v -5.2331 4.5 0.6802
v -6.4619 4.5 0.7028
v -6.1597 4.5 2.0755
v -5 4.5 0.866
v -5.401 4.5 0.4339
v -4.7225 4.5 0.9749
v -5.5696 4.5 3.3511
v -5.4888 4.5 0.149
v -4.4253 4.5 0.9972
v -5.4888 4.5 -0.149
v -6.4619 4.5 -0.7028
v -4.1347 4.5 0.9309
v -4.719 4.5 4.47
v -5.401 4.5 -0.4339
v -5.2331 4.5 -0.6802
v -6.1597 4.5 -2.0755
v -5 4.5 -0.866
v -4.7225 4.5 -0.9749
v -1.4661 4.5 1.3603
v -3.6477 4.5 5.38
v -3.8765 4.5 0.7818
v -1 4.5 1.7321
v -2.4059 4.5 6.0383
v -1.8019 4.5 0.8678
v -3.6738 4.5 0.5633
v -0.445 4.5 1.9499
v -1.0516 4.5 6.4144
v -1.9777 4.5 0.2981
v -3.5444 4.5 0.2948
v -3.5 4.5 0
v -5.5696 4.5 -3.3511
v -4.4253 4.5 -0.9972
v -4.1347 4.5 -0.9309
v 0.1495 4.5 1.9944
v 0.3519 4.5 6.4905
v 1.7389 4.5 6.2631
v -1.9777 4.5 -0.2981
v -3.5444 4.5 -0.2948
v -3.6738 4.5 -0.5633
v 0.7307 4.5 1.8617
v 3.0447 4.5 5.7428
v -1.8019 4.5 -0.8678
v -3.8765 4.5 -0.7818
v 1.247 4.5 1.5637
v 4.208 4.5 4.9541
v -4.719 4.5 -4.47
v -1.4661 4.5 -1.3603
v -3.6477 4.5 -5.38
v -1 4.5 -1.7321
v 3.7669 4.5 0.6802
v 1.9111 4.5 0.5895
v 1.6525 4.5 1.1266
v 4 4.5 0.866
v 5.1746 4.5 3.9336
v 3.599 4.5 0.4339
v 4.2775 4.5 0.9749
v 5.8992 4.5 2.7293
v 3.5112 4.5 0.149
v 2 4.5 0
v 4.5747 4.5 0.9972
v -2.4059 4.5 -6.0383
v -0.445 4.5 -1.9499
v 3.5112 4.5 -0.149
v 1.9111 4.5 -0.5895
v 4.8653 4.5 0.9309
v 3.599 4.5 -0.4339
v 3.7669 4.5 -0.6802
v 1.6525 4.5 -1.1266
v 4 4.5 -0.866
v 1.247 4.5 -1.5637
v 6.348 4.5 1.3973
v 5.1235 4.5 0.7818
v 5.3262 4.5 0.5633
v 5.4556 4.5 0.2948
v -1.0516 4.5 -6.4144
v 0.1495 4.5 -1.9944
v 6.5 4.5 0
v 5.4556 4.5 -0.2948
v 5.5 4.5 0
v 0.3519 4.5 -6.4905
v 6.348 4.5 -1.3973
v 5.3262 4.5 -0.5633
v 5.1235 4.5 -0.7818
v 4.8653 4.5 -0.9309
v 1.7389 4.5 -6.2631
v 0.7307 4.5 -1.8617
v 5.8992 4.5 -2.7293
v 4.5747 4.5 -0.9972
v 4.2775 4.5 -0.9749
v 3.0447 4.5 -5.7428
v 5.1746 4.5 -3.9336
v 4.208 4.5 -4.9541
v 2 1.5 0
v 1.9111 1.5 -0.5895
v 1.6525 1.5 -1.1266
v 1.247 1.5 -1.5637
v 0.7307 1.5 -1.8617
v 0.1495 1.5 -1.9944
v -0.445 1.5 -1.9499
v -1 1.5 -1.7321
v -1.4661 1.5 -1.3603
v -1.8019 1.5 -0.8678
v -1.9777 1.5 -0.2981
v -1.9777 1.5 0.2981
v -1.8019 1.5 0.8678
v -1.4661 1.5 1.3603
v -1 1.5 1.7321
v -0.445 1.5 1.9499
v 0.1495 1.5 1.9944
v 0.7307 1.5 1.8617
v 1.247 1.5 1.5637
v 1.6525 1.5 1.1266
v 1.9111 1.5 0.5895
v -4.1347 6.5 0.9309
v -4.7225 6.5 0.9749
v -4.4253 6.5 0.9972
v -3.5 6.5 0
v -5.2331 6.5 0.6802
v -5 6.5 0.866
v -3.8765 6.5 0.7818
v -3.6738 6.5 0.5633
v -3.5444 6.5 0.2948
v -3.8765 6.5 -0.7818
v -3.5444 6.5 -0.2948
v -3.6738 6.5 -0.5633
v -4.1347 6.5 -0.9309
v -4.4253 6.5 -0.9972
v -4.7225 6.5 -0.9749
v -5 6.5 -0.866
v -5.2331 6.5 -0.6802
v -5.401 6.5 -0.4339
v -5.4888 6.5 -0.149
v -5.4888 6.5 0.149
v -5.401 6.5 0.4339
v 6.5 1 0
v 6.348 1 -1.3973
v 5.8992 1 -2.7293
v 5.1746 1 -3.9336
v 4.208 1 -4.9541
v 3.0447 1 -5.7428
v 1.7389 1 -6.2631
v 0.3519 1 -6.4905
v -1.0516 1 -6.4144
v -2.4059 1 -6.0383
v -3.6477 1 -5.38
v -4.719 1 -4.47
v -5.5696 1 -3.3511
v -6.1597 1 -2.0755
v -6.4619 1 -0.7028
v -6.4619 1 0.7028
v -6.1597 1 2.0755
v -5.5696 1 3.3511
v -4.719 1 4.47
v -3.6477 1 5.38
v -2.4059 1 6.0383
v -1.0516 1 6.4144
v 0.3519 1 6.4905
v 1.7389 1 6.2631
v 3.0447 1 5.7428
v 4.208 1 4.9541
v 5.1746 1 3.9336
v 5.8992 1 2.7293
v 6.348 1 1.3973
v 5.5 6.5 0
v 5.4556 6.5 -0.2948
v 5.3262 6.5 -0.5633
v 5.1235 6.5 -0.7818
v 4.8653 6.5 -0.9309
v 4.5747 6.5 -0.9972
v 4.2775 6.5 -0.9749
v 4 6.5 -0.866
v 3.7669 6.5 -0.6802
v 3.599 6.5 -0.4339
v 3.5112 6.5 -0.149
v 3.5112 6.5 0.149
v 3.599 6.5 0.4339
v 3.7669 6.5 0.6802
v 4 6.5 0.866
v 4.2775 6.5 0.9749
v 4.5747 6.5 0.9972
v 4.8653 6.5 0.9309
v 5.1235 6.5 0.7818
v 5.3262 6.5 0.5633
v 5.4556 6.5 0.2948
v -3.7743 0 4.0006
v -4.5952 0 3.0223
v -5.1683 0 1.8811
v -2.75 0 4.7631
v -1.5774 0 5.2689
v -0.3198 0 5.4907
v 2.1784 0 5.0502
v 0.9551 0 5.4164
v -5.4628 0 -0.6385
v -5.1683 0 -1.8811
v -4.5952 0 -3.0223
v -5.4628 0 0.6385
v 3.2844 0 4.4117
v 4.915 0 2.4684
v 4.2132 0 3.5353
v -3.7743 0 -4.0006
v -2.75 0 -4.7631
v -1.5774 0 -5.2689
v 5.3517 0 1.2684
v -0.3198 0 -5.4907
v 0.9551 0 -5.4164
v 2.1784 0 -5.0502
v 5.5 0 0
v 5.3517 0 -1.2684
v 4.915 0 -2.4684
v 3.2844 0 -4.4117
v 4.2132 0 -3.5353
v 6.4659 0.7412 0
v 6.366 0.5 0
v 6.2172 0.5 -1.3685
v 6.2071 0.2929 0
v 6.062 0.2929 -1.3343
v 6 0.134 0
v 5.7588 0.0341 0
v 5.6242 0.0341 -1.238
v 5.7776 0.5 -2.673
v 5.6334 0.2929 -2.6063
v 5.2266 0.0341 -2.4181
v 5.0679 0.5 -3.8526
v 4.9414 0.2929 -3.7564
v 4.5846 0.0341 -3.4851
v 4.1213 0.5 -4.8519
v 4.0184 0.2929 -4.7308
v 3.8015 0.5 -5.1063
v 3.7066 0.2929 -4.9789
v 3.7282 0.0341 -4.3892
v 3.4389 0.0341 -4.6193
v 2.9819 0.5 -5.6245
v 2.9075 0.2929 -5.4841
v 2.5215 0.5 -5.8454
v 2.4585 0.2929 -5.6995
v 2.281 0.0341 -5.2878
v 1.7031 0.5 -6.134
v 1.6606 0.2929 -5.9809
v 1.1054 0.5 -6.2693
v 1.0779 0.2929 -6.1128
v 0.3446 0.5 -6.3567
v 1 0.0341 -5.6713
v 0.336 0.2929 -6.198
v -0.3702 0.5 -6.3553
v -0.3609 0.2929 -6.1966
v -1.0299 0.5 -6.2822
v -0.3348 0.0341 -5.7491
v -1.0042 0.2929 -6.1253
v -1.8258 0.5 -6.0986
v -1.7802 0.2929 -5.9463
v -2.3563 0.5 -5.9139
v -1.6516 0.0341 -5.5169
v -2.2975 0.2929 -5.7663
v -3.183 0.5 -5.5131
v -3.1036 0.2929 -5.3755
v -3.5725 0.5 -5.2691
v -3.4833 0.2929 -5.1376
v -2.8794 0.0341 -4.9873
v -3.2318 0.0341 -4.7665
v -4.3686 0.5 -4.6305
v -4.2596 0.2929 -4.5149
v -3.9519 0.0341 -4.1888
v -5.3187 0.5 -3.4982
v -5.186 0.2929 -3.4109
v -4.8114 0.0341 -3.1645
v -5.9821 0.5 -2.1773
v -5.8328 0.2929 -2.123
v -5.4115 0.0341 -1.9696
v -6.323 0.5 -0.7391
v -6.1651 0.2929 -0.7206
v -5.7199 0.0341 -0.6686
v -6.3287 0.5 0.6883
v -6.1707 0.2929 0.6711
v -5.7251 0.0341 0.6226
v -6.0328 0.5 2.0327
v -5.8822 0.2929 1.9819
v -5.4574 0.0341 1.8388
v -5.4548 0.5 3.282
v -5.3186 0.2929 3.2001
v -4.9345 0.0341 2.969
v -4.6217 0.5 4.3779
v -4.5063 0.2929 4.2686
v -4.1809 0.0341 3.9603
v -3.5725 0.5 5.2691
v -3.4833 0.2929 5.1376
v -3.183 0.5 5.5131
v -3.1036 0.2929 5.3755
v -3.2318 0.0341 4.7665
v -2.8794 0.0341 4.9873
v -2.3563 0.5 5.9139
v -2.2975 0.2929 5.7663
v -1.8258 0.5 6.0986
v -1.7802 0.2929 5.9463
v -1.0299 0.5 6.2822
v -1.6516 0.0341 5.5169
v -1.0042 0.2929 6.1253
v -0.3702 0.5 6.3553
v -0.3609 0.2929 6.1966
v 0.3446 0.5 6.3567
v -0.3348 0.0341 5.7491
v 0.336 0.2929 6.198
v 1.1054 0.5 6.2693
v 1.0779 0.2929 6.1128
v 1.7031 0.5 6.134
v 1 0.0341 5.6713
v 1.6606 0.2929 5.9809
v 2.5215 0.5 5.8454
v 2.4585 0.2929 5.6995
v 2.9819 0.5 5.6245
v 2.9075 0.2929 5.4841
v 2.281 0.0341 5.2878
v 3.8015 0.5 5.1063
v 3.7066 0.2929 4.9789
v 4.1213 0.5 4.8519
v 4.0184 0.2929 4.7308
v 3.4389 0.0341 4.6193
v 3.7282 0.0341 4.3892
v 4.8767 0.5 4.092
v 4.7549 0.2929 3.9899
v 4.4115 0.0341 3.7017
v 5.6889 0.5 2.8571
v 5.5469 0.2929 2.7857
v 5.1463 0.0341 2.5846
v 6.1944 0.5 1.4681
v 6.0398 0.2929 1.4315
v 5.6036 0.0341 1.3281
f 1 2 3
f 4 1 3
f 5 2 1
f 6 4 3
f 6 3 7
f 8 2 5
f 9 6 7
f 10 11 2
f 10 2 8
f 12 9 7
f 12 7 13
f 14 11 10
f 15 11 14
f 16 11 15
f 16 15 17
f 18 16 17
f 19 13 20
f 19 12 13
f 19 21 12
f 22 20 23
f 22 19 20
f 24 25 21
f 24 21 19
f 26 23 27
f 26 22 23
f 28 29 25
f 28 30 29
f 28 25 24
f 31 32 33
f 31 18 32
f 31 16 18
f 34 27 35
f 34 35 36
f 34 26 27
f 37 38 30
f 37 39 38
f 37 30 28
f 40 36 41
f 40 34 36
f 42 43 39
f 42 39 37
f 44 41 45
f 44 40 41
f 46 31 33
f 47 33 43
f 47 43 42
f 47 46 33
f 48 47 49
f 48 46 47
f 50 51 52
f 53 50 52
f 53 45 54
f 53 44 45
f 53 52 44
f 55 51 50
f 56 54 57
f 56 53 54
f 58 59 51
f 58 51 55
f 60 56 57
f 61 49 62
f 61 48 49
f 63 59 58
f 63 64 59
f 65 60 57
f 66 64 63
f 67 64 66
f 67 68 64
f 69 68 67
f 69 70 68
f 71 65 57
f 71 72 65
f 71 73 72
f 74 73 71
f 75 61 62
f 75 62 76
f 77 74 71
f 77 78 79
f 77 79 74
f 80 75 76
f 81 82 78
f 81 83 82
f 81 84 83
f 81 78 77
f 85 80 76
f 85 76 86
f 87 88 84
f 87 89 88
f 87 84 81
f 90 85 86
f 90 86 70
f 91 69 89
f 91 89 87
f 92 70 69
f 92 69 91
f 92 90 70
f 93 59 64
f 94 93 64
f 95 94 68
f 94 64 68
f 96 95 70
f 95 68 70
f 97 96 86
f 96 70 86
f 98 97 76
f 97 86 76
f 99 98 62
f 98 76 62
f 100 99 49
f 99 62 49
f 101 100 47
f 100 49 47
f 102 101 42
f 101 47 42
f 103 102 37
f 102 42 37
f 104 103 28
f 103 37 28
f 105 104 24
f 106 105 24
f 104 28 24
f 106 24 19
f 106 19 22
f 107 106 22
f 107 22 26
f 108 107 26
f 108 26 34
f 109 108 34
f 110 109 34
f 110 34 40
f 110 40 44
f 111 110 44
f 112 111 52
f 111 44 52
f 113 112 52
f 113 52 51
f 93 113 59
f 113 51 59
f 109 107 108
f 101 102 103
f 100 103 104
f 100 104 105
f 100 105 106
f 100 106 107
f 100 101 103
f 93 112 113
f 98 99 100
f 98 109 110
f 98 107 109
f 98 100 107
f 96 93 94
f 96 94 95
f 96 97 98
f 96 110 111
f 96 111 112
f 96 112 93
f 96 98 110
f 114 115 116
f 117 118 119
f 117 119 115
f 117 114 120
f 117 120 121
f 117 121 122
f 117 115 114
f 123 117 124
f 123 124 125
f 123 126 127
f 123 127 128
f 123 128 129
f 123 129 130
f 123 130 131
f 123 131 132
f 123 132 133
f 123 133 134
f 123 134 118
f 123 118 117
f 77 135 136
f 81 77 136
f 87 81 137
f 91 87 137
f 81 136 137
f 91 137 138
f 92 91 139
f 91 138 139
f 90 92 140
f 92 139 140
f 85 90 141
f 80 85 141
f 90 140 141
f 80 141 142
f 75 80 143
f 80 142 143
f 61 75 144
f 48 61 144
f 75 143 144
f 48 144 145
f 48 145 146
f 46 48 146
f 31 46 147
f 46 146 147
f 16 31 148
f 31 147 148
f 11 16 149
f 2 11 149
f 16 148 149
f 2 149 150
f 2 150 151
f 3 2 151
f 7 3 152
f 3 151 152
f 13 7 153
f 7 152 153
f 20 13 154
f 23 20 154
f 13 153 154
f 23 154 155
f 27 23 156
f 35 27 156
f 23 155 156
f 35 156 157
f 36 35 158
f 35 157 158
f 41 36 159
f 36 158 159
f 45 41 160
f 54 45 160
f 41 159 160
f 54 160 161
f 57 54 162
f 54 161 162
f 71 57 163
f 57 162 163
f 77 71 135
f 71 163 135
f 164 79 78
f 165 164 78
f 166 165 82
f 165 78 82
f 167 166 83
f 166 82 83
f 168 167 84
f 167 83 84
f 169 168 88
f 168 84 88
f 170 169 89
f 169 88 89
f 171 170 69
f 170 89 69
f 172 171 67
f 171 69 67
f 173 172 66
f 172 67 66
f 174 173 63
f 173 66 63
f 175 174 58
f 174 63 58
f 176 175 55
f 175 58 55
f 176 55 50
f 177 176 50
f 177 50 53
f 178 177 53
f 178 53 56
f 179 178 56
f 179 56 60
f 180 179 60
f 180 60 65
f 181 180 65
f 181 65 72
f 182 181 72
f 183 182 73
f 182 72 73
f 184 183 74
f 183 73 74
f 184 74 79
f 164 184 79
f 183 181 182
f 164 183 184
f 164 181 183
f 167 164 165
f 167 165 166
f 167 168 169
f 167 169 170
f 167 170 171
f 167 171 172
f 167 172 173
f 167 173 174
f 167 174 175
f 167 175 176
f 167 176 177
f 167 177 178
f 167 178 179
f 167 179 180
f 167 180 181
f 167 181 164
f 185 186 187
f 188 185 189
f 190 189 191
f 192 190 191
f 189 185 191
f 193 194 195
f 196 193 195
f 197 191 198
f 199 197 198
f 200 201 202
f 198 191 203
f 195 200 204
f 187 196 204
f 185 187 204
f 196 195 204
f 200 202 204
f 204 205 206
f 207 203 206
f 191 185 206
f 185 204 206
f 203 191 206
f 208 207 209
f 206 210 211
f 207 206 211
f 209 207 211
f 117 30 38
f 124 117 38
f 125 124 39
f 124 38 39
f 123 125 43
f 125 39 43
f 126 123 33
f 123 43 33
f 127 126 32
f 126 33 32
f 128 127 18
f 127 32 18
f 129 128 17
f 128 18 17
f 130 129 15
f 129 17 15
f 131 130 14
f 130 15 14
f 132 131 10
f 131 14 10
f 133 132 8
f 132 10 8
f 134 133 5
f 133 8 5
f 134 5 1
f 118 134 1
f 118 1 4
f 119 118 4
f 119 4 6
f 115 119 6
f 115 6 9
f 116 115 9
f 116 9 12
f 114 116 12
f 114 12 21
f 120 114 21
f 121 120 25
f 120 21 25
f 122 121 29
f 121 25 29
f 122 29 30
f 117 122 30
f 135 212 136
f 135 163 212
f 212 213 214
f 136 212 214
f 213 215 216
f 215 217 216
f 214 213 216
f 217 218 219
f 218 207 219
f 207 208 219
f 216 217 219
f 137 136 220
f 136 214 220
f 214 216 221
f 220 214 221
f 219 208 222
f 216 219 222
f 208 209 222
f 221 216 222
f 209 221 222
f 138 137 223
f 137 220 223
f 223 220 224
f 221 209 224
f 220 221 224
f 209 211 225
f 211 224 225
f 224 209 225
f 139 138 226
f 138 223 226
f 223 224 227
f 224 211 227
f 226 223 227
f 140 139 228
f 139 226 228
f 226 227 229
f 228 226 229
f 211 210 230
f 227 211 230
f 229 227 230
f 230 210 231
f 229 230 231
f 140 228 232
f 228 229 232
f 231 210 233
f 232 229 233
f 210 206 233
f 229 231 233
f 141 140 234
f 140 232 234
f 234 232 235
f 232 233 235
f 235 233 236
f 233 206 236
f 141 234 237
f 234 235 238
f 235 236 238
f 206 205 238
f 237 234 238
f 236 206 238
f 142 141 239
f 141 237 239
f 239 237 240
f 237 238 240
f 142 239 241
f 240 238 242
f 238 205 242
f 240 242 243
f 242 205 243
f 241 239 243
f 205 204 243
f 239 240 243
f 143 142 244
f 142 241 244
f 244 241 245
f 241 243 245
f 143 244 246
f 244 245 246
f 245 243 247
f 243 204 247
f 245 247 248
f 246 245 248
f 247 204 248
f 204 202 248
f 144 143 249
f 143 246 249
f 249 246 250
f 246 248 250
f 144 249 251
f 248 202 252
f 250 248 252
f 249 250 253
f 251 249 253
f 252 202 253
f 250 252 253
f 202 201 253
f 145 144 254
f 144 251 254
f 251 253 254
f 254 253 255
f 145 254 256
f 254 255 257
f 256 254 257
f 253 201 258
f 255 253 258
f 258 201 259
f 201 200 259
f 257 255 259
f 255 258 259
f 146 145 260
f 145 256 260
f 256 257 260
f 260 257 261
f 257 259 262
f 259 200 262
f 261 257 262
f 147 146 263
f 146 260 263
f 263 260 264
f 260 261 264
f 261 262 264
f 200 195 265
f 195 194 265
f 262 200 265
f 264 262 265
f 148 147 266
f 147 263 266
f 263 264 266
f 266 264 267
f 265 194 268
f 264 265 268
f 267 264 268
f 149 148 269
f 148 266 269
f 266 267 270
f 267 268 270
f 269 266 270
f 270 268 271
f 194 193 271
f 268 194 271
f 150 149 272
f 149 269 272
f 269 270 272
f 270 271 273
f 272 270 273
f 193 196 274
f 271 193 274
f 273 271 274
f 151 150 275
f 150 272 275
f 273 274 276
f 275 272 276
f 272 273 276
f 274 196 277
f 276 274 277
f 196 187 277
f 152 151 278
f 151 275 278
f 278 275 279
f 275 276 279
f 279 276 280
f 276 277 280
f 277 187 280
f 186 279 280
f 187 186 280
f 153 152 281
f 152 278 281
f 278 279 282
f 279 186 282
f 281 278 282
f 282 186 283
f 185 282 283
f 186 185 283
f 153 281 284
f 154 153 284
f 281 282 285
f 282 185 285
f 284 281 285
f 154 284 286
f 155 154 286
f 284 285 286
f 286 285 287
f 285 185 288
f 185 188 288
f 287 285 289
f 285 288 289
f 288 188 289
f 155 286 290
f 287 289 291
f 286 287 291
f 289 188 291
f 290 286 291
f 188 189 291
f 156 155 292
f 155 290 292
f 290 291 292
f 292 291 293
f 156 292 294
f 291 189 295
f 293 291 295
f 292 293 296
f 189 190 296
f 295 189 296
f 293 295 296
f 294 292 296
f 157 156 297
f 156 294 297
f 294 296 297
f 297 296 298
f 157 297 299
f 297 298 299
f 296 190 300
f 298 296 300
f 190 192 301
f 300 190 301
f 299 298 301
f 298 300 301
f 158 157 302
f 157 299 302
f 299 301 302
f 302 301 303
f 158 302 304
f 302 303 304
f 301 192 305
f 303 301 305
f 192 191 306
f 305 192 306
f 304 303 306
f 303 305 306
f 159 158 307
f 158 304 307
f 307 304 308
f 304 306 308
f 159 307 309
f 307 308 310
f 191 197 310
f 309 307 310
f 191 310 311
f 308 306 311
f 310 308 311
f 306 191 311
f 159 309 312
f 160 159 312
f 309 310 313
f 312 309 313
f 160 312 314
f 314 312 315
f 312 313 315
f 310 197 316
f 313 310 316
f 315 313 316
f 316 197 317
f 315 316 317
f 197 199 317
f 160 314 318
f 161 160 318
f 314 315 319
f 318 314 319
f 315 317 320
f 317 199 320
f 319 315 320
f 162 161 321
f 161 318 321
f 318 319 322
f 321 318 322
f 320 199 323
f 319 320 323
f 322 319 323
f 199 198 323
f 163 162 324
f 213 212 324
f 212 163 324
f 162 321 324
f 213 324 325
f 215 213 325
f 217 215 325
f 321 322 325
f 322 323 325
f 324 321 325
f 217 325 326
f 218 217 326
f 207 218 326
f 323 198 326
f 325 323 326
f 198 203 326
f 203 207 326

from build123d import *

# Parameters (mm, degrees)
F0_R     = 6.5
F1_DEPTH = 4.5
F2_R     = 2
F3_DEPTH = 3
F4_R     = 1
F5_DEPTH = 2
F6_R     = 1
F8_ANGLE = -90


with BuildPart() as f1:
    # F0 (on Top) → F1 (new body)
    with BuildSketch(Plane.XY):
        Circle(F0_R)
    extrude(amount=F1_DEPTH)

    # F2 (on face) → F3 (cut)
    with BuildSketch(Plane.XY.offset(4.5)):
        Circle(F2_R)
    extrude(amount=-F3_DEPTH, mode=Mode.SUBTRACT)

    # F4 (on face) → F5 (join)
    with BuildSketch(Plane.XY.offset(4.5)):
        with Locations((-4.5, 0)):
            Circle(F4_R)
        with Locations((4.5, 0)):
            Circle(F4_R)
    extrude(amount=F5_DEPTH)

    # F6
    f6_edges = [f1.edges().sort_by_distance(p)[0] for p in [
        (-6.5, 0, 0),
    ]]
    fillet(f6_edges, radius=F6_R)


with BuildPart() as f1_1:
    # F8: moved
    add(f1.part.rotate(Axis((4.46189, 0, 0), (1, 0, 0)), F8_ANGLE))


solid = f1_1.part
